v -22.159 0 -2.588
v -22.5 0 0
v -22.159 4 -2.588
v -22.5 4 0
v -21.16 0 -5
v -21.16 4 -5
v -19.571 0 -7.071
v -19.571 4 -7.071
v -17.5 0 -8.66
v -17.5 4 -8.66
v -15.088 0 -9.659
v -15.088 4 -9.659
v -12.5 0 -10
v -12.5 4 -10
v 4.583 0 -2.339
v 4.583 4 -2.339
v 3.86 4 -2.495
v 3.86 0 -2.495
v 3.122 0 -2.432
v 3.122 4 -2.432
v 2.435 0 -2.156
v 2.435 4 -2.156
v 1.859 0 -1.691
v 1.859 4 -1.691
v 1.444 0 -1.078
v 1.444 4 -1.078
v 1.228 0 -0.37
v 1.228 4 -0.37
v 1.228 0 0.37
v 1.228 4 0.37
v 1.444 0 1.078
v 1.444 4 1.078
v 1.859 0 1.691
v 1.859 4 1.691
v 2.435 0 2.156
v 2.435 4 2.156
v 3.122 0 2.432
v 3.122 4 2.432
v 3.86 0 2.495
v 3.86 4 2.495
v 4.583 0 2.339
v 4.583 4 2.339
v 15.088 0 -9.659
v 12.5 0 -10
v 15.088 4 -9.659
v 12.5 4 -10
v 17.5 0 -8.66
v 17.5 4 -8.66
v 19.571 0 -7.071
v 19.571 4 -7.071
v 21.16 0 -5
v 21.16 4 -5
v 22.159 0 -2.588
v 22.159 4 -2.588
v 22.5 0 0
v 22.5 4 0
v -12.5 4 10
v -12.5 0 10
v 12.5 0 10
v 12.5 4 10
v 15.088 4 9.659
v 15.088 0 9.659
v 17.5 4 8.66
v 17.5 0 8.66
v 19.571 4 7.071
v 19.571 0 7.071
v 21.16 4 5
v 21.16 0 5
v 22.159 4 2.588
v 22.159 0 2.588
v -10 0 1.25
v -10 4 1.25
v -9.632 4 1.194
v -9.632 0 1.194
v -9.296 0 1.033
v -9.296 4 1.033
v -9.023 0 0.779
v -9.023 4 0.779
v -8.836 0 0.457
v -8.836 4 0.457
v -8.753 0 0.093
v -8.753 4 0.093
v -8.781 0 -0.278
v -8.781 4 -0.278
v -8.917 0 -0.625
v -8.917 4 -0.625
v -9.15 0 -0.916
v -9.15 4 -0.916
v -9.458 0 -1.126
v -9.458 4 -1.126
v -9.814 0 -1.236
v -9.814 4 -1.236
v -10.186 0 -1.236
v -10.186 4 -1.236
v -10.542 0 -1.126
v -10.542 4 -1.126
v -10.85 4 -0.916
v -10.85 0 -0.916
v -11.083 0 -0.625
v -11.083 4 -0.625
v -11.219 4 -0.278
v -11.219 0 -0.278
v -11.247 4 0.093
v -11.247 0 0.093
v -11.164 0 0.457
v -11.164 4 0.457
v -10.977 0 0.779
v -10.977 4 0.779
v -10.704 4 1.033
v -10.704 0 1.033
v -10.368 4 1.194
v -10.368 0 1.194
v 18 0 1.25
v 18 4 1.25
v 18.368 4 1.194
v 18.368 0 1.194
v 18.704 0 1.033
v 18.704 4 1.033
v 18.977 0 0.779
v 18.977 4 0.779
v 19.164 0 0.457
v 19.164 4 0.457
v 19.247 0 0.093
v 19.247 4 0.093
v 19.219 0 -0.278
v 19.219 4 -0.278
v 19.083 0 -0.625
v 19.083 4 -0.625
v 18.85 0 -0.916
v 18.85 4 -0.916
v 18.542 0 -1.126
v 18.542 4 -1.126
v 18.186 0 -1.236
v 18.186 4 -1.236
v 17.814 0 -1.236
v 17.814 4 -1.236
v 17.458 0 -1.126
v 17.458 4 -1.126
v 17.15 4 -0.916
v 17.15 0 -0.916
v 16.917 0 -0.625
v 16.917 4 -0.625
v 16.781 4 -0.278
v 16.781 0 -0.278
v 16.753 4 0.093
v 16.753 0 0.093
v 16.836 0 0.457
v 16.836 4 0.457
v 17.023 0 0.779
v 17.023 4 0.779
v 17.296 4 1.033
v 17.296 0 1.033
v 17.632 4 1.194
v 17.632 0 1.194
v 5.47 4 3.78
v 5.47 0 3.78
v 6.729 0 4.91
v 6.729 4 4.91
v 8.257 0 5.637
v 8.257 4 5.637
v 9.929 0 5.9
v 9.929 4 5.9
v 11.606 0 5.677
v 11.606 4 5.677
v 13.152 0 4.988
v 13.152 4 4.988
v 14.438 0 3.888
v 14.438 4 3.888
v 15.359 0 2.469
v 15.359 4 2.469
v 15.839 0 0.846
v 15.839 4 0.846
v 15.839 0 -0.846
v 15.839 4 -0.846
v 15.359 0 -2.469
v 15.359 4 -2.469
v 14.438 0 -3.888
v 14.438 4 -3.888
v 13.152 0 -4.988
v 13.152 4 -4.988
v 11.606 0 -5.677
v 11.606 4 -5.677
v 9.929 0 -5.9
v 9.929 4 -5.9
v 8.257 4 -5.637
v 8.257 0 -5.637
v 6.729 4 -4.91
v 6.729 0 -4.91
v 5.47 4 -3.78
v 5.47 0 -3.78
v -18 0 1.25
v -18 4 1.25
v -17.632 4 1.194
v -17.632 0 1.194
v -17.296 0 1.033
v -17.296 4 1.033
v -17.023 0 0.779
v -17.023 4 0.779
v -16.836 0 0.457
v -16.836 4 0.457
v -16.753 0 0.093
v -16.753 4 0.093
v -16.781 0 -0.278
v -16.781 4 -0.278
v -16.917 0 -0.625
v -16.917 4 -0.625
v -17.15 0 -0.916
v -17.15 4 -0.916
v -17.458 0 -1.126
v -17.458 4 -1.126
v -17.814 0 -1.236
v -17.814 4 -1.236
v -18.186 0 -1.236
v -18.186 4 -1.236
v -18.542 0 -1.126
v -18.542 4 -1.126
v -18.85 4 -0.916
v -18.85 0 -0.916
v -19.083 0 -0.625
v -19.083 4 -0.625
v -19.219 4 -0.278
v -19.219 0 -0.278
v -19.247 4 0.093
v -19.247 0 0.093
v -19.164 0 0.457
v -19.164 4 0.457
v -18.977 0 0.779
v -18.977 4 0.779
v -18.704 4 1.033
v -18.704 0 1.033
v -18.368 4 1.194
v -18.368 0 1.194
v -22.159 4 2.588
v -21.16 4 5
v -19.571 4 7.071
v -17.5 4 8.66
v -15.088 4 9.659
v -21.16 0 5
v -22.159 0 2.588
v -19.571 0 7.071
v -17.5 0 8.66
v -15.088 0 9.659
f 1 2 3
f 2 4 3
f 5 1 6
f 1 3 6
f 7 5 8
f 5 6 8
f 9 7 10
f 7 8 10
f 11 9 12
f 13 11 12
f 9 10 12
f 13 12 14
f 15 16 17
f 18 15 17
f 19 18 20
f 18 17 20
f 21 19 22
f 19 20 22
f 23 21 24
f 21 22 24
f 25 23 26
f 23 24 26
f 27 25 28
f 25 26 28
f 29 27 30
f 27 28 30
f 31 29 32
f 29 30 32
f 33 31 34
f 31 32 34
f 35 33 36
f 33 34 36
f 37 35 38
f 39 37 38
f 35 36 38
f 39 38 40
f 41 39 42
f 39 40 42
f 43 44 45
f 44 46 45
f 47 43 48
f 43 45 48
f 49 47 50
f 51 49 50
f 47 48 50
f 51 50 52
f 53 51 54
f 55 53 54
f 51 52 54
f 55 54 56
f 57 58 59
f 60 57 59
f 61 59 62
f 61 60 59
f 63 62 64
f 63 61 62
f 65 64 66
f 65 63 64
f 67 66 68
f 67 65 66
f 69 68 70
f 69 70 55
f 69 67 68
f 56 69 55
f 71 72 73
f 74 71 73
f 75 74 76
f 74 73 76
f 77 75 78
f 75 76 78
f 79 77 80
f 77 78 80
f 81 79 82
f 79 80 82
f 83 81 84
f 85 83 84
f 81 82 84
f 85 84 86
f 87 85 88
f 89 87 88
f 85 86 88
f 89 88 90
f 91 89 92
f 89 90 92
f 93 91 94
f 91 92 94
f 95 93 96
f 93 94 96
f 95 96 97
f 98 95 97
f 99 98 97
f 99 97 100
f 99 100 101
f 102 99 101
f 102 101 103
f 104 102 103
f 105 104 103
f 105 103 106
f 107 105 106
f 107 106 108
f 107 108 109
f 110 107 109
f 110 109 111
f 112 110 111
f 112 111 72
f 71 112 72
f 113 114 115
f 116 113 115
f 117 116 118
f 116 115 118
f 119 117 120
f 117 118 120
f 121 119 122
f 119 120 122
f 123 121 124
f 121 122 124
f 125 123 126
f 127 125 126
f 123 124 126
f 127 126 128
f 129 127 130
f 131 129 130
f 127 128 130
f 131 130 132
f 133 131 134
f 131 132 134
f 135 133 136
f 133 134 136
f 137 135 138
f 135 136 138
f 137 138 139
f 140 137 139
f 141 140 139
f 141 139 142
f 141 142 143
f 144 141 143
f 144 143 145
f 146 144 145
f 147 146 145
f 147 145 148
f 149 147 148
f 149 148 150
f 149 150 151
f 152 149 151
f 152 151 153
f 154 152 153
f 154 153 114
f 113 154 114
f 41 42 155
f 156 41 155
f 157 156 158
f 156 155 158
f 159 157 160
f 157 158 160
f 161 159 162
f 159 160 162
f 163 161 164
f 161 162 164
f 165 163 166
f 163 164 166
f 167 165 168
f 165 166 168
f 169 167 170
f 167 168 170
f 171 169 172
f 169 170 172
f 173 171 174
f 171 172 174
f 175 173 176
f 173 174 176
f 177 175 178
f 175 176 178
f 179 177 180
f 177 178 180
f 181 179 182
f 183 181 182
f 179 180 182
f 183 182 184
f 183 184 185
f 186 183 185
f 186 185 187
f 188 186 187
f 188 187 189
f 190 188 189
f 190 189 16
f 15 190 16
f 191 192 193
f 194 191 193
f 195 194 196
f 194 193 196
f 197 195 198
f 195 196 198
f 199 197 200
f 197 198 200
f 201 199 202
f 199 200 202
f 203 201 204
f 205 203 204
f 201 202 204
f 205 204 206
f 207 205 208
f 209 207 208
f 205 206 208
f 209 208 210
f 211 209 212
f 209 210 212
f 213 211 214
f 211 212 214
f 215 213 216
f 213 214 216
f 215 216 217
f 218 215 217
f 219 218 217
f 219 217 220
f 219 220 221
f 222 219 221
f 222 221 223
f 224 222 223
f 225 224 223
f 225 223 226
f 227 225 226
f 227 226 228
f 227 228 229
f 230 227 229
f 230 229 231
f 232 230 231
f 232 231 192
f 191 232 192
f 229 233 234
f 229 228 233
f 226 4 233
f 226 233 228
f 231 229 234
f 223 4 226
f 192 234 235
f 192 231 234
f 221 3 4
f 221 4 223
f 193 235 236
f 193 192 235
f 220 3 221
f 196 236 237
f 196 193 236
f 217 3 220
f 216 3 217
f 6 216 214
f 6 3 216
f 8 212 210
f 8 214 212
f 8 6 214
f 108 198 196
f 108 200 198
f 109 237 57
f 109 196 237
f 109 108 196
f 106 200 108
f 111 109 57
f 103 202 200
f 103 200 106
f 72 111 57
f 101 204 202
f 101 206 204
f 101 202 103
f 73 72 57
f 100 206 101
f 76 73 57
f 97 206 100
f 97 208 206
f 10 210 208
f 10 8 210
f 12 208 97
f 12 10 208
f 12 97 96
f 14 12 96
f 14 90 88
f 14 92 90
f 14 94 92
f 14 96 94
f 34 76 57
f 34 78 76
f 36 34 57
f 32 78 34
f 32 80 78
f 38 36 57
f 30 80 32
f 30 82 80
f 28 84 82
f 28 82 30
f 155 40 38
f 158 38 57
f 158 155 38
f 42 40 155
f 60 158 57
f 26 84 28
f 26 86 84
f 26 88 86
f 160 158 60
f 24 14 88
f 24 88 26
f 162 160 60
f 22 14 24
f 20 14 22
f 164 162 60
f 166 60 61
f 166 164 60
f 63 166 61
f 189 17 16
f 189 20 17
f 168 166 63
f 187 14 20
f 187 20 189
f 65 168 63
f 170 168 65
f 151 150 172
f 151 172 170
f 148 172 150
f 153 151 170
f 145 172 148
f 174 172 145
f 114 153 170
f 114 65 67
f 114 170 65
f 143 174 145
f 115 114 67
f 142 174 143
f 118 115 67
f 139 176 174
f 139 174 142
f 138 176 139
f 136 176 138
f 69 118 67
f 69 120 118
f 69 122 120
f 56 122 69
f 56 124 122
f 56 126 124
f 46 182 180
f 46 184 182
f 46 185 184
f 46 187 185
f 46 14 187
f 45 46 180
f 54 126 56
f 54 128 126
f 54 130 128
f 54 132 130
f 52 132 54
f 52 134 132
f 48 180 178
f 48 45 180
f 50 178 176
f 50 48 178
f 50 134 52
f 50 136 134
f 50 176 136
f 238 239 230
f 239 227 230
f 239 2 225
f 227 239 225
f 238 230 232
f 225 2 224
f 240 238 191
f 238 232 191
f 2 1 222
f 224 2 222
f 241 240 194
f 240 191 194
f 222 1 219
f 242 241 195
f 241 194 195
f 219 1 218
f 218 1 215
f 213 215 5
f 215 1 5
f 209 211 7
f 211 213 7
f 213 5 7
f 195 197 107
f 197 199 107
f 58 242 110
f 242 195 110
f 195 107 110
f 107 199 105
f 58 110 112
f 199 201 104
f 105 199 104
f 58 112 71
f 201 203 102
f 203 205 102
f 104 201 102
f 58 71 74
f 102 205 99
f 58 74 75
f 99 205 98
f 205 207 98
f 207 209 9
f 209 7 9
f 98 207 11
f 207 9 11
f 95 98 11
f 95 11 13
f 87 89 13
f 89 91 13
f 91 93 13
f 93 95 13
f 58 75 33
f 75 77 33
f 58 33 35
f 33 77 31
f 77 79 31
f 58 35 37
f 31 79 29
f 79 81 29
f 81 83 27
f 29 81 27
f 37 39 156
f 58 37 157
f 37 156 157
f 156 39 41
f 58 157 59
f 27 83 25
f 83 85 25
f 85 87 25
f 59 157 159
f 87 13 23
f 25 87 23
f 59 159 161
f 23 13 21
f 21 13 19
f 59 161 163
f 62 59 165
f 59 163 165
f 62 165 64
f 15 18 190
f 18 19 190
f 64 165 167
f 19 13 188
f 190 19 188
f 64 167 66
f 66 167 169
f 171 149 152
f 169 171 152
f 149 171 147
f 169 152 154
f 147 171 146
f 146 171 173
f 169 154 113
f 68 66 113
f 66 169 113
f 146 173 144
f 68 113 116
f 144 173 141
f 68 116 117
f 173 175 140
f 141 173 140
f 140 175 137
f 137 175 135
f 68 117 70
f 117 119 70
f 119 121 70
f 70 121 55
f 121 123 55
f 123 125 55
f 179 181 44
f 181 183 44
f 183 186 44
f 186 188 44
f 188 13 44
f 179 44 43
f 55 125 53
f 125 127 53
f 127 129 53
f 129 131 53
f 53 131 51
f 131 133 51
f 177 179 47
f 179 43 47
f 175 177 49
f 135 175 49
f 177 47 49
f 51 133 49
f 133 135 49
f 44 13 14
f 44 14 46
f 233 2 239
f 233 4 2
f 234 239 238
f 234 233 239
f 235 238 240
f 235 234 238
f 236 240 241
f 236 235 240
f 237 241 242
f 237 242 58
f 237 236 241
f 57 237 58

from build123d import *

# Parameters (mm, degrees)
SKETCH1_W           = 45
SKETCH1_H           = 20
BOSS_EXTRUDE1_DEPTH = 4
SKETCH2_R           = 1.25
CUT_EXTRUDE1_DEPTH  = 25.944939367
FILLET2_R           = 10


with BuildPart() as part:
    # Sketch1 → Boss-Extrude1 (new body)
    with BuildSketch(Plane(origin=(0, 0, 0), x_dir=(1, 0, 0), z_dir=(0, 1, 0))):
        Rectangle(SKETCH1_W, SKETCH1_H)
    extrude(amount=BOSS_EXTRUDE1_DEPTH)

    # Sketch2 → Cut-Extrude1 (cut, through all)
    with BuildSketch(Plane(origin=(0, 4, 0), x_dir=(1, 0, 0), z_dir=(0, 1, 0))):
        with Locations(Location((18, 0, 0), (0, 0, 270))):
            Circle(SKETCH2_R)
        with Locations(Location((-10, 0, 0), (0, 0, 270))):
            Circle(SKETCH2_R)
        with Locations(Location((-18, 0, 0), (0, 0, 270))):
            Circle(SKETCH2_R)
        with BuildLine():
            ThreePointArc((4.583333333, -2.338743727), (15.9, 0), (4.583333333, 2.338743727))
            ThreePointArc((4.583333333, 2.338743727), (1.2, 0), (4.583333333, -2.338743727))
        make_face()
    extrude(amount=-CUT_EXTRUDE1_DEPTH, mode=Mode.SUBTRACT)

    # Fillet2
    fillet2_edges = [part.edges().sort_by_distance(p)[0] for p in [
        (-22.5, 2, -10),
        (22.5, 2, -10),
        (-22.5, 2, 10),
        (22.5, 2, 10),
    ]]
    fillet(fillet2_edges, radius=FILLET2_R - 0.0001)  # a hair under: the kernel refuses the full size


solid = part.part
